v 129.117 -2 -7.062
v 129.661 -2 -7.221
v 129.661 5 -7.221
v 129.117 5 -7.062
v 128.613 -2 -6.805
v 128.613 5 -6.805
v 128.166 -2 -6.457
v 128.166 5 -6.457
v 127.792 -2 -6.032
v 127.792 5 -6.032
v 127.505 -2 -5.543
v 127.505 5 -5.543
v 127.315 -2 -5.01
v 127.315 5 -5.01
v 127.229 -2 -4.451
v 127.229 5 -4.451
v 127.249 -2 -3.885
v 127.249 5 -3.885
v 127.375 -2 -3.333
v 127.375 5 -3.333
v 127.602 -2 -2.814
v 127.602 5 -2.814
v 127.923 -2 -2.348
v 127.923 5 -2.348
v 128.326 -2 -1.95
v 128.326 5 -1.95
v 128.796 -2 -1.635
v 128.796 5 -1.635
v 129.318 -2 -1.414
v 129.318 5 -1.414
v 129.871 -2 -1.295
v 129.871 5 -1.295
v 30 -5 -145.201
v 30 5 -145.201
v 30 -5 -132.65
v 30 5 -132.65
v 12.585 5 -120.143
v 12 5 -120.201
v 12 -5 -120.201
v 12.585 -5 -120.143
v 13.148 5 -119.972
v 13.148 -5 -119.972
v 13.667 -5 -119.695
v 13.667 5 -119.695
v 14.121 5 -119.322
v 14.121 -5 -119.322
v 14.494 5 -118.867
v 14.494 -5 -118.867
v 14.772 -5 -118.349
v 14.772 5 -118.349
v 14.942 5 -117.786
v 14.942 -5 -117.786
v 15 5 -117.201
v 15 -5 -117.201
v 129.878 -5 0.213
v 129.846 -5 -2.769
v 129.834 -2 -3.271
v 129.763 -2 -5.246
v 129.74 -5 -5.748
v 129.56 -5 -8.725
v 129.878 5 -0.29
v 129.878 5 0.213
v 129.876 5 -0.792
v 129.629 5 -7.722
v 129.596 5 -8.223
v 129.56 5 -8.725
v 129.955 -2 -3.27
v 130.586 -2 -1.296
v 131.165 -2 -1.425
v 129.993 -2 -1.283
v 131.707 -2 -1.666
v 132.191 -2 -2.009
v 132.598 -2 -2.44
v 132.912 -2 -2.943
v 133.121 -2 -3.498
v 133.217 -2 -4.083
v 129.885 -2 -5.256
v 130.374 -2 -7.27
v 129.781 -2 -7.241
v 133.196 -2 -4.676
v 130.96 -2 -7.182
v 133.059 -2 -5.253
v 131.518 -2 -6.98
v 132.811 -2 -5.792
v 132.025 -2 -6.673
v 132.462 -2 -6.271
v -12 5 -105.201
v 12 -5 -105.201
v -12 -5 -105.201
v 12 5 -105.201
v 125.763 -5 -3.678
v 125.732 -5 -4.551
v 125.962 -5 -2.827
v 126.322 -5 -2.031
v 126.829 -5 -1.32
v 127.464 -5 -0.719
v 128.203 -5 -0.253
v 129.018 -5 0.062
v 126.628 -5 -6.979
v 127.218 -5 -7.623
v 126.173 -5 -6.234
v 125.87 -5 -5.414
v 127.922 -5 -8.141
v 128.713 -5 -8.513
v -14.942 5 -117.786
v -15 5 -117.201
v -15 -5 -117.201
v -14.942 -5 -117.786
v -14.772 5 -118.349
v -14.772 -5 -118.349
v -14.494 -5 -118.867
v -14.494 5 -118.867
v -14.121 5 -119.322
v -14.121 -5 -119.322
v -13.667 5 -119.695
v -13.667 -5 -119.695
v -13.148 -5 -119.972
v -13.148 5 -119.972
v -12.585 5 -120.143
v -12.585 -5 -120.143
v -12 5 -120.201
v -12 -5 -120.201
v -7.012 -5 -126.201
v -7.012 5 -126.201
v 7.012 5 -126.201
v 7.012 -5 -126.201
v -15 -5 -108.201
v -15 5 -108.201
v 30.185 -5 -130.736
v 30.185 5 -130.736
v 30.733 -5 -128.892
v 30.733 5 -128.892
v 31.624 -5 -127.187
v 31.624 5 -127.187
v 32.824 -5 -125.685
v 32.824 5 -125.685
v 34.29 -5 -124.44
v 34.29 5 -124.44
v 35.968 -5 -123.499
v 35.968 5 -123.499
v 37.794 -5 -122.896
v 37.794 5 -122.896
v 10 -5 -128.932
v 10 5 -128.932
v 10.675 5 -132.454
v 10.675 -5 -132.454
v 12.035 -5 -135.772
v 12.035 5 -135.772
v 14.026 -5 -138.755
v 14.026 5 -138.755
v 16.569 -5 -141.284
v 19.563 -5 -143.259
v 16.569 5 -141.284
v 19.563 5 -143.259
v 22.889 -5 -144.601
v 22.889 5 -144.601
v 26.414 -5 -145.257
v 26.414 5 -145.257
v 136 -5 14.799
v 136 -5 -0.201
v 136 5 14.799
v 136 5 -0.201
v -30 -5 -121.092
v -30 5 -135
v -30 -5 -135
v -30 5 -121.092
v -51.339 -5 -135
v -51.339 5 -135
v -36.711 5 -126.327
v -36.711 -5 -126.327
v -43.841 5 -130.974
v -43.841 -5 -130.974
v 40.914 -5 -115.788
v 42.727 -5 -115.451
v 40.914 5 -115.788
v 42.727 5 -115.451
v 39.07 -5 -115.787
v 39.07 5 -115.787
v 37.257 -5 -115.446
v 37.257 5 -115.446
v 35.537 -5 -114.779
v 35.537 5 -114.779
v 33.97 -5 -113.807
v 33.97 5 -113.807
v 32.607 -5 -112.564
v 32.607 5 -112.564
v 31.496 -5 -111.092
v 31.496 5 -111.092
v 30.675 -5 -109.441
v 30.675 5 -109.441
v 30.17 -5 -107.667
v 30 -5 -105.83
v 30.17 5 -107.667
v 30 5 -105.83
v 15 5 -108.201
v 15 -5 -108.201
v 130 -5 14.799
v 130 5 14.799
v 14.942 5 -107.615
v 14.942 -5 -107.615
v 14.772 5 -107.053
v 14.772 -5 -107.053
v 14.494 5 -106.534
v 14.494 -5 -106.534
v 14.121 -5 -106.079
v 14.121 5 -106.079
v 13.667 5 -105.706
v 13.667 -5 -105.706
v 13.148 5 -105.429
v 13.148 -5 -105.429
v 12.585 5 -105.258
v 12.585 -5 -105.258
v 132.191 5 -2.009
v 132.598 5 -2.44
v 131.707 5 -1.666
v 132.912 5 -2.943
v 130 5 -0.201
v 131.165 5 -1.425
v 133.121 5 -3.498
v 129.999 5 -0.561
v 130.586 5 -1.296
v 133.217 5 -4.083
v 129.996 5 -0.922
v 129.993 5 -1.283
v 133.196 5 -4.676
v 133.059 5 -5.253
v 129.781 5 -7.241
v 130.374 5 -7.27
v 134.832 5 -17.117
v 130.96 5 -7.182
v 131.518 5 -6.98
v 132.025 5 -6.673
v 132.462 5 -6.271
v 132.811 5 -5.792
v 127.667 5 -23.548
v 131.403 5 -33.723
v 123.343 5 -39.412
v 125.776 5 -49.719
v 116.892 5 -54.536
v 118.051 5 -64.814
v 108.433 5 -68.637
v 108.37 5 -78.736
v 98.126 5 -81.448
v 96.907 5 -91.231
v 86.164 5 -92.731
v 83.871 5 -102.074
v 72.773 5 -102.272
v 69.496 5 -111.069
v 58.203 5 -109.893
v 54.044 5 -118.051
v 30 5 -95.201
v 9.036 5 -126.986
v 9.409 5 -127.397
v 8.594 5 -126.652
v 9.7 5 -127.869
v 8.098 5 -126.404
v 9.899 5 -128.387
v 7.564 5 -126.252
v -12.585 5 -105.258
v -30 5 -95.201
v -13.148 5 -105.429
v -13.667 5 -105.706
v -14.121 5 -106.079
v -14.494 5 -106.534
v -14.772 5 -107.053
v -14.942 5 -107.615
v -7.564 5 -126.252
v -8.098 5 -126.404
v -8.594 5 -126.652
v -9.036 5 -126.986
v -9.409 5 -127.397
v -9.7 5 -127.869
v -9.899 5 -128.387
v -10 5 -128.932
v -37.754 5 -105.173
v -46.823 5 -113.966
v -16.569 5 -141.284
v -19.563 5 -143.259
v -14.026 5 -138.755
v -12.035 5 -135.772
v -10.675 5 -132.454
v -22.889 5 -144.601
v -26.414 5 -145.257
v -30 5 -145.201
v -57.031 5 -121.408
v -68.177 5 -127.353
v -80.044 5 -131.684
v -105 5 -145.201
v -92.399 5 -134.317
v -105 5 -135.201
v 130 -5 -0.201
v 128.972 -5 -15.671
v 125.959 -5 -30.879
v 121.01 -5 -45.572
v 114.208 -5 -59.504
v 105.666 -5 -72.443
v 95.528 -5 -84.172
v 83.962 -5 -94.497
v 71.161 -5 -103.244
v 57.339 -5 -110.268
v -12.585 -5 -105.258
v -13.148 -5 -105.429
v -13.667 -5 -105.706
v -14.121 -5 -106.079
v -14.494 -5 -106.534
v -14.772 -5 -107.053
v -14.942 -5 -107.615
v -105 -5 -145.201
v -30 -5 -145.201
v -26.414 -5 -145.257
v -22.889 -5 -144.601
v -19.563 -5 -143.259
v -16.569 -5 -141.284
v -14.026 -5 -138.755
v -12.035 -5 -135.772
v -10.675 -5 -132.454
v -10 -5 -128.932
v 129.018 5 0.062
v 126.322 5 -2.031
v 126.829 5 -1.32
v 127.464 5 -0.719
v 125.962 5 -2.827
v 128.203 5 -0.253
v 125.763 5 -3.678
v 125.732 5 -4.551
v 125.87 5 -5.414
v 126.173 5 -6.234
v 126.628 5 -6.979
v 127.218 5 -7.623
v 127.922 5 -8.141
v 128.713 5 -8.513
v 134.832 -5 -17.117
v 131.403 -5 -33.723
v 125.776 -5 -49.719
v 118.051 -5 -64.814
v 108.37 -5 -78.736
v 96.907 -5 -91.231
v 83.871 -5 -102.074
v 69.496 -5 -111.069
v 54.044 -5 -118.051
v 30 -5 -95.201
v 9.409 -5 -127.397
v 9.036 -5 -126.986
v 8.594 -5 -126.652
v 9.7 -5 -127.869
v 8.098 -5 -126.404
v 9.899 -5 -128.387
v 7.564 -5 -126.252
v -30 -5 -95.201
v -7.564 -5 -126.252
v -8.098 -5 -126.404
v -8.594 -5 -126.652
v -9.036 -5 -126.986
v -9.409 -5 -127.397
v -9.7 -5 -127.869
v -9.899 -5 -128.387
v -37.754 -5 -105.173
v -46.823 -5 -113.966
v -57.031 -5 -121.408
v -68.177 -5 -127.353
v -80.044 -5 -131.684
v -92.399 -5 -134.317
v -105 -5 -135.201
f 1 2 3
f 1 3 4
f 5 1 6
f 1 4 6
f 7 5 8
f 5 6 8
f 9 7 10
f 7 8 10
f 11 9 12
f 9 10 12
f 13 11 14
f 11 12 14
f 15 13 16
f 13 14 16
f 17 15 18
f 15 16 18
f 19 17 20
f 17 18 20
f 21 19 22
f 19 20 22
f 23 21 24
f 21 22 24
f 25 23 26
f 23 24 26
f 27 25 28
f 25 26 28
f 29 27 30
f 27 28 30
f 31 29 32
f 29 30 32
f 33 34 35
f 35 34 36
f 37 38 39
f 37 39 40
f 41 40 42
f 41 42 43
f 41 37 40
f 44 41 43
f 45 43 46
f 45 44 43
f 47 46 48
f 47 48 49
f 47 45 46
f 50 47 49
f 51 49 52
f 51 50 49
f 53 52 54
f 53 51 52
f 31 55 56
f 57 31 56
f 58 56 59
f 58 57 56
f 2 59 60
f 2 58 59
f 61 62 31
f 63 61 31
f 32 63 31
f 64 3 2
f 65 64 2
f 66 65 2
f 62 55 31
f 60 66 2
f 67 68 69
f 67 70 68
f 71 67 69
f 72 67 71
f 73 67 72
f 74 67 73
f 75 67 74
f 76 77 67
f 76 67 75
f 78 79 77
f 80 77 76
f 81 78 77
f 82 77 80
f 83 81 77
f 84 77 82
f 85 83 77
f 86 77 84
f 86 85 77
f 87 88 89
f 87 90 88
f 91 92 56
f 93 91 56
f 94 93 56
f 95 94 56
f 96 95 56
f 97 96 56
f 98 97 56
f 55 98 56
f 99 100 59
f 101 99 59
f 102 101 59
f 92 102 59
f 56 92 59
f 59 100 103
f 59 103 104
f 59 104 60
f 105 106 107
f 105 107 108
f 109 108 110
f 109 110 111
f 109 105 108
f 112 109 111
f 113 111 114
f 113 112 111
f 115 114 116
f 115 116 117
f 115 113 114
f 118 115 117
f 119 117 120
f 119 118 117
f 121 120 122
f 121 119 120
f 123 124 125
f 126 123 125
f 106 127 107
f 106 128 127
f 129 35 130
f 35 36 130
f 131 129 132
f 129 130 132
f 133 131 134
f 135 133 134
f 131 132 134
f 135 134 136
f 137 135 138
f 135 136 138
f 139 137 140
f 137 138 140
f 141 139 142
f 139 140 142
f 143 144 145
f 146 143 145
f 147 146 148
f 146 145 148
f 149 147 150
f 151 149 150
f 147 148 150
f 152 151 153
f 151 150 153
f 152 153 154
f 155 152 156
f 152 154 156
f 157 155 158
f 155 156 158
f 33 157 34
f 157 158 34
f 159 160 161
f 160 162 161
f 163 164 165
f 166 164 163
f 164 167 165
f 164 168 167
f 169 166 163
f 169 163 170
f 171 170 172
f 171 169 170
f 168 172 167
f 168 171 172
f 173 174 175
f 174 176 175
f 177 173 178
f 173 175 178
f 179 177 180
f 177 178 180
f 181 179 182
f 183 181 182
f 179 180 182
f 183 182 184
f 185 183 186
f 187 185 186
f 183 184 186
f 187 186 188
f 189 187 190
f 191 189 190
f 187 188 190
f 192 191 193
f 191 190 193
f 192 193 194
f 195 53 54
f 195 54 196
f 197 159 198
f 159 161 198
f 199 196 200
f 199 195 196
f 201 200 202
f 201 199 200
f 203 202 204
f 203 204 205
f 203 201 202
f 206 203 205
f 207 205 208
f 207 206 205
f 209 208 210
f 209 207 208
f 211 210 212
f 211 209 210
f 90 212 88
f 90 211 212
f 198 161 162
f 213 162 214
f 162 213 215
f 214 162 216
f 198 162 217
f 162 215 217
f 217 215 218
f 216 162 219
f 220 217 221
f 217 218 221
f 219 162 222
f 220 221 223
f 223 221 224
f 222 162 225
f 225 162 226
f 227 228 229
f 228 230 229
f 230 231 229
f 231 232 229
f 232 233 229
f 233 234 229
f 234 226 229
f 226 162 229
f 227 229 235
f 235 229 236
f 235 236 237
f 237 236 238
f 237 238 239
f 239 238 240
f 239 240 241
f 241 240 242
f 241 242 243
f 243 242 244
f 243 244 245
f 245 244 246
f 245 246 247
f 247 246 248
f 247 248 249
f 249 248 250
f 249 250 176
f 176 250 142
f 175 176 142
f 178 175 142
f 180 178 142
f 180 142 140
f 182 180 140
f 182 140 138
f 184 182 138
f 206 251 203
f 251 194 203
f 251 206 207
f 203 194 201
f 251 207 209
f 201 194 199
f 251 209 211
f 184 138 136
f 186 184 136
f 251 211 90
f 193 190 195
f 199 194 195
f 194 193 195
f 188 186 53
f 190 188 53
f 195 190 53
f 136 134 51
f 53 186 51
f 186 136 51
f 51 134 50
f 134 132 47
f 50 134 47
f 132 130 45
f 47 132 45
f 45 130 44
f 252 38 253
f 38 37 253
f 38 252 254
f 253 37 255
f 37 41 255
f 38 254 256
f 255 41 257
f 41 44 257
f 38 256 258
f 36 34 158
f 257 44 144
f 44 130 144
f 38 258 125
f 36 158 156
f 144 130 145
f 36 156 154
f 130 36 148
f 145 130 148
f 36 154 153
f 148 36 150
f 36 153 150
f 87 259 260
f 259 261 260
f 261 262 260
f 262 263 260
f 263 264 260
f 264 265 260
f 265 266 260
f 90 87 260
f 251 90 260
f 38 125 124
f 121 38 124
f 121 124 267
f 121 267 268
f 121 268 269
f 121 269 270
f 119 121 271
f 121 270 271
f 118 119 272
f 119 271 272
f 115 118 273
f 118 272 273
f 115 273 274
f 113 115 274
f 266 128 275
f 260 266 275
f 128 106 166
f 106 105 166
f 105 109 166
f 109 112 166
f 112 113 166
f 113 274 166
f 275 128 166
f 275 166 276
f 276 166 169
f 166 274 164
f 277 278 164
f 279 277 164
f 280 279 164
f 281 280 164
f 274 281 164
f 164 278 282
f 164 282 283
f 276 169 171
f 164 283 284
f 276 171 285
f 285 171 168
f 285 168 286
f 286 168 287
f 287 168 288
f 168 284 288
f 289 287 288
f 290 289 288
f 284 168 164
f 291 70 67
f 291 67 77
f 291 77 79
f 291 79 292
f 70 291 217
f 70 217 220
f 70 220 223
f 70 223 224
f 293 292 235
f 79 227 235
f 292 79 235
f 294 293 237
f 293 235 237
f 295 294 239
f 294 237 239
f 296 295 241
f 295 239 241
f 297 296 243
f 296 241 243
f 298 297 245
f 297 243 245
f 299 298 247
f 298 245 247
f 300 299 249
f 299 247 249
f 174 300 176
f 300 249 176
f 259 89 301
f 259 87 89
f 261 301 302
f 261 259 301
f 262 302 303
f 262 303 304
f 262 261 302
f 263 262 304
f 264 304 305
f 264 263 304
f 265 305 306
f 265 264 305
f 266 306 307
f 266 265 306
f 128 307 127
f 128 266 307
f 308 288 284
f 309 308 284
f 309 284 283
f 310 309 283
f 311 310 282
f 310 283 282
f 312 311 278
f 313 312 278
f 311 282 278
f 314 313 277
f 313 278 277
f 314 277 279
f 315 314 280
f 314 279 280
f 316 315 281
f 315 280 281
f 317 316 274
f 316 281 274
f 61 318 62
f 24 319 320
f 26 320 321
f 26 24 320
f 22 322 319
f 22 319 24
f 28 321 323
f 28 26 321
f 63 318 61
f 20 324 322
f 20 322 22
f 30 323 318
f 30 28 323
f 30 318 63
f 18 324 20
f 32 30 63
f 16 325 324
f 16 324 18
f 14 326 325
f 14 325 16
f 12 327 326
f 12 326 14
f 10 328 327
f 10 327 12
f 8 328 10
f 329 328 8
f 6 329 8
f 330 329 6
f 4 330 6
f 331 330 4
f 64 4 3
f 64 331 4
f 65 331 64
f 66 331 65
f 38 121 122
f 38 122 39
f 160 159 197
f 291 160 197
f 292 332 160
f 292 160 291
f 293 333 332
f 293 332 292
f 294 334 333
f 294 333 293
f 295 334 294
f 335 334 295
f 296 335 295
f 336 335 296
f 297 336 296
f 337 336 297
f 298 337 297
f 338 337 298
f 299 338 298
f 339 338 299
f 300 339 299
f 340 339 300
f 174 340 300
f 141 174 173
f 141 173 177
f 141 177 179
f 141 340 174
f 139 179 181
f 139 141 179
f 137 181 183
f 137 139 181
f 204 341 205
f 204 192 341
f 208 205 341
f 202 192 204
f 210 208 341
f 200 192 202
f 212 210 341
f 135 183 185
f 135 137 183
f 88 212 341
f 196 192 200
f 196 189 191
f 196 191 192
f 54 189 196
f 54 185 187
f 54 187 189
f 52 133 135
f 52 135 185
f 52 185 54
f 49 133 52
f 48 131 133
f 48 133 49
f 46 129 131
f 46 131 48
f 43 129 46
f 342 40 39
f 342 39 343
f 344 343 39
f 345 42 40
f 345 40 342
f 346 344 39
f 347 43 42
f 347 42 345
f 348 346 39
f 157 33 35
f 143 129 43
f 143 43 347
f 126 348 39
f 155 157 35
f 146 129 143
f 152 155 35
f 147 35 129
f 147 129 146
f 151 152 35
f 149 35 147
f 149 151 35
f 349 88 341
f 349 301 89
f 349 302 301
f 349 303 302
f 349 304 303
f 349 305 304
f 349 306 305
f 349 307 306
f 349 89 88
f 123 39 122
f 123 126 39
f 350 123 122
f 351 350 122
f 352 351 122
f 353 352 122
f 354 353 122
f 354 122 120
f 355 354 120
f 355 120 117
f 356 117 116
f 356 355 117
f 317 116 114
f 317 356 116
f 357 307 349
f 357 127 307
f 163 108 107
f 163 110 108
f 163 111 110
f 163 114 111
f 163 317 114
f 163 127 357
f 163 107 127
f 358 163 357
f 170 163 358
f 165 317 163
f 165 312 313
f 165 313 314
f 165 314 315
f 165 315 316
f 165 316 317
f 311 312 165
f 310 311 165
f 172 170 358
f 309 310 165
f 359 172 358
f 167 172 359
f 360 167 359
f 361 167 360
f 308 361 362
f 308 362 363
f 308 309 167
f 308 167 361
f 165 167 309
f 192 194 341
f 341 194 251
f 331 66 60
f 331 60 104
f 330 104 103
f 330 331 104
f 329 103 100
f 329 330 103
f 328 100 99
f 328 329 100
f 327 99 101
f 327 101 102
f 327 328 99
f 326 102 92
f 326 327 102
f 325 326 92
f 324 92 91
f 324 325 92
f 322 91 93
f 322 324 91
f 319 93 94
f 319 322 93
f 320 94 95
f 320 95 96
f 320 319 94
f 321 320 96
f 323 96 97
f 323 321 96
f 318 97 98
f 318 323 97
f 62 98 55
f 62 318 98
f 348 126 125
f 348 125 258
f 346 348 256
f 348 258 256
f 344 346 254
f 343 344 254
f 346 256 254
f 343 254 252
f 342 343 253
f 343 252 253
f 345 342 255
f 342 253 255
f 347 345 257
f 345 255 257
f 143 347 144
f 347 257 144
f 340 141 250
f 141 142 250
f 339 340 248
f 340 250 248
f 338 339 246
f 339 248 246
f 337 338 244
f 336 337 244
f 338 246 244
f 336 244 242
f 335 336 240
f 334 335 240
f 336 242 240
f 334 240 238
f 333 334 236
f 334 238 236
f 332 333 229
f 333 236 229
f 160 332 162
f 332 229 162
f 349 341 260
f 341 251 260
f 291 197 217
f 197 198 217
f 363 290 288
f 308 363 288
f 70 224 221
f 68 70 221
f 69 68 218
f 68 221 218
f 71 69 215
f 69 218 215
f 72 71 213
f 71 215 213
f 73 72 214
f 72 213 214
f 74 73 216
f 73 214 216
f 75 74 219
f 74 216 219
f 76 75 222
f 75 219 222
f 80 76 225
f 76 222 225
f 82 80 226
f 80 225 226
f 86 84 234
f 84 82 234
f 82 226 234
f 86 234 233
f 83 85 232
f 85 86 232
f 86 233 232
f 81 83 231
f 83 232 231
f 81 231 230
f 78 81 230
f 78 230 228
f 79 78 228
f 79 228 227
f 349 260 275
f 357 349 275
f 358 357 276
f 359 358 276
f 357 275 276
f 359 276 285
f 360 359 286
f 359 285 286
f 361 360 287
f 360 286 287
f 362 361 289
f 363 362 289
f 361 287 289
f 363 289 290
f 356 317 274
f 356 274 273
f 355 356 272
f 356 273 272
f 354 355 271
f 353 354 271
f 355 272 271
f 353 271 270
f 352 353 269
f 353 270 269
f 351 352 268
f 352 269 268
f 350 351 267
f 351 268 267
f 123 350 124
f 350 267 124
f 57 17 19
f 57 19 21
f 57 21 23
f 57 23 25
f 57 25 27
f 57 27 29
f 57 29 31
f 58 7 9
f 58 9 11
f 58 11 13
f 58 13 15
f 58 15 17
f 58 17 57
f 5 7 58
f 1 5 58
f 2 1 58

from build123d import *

# Parameters (mm, degrees)
BOSS_EXTRUDE1_DEPTH = 5
BOSS_EXTRUDE2_DEPTH = 10
SKETCH4_R           = 3
CUT_EXTRUDE2_DEPTH  = 7


with BuildPart() as part:
    # Sketch1 → Boss-Extrude1 (new, symmetric)
    with BuildSketch(Plane(origin=(0, 0, 0), x_dir=(1, 0, 0), z_dir=(0, 1, 0))):
        with BuildLine():
            Line((30, 145.200641517), (30, 132.64991519))
            ThreePointArc((30, 132.64991519), (32.187867656, 126.407272462), (37.794117647, 122.896244956))
            ThreePointArc((37.794117647, 122.896244956), (108.370209653, 78.735645376), (135.99984025, 0.200641517))
            Line((135.99984025, 0.200641517), (135.99984025, -14.799358483))
            Line((135.99984025, -14.799358483), (129.999832262, -14.799358483))
            Line((129.999832262, -14.799358483), (129.999832262, 0.200641517))
            ThreePointArc((129.999832262, 0.200641517), (105.666355059, 72.44272572), (42.727272727, 115.450966301))
            ThreePointArc((42.727272727, 115.450966301), (33.969773108, 113.807292795), (30, 105.830052443))
            Line((30, 105.830052443), (30, 95.200641517))
            Line((30, 95.200641517), (-30, 95.200641517))
            ThreePointArc((-30, 95.200641517), (-62.5, 124.575641517), (-105, 135.200641517))
            Line((-105, 135.200641517), (-105, 145.200641517))
            Line((-105, 145.200641517), (-30, 145.200641517))
            ThreePointArc((-30, 145.200641517), (-16.569205688, 141.284017765), (-10, 128.932025452))
            ThreePointArc((-10, 128.932025452), (-9.036173455, 126.986386767), (-7.012049965, 126.200641517))
            Line((-7.012049965, 126.200641517), (7.012049965, 126.200641517))
            ThreePointArc((7.012049965, 126.200641517), (9.036173455, 126.986386767), (10, 128.932025452))
            ThreePointArc((10, 128.932025452), (16.569205688, 141.284017765), (30, 145.200641517))
        make_face()
        with BuildLine():
            Line((-15, 108.200641517), (-15, 117.200641517))
            ThreePointArc((-15, 117.200641517), (-14.121320344, 119.321961861), (-12, 120.200641517))
            Line((-12, 120.200641517), (12, 120.200641517))
            ThreePointArc((12, 120.200641517), (14.121320344, 119.321961861), (15, 117.200641517))
            Line((15, 117.200641517), (15, 108.200641517))
            ThreePointArc((15, 108.200641517), (14.121320344, 106.079321174), (12, 105.200641517))
            Line((12, 105.200641517), (-12, 105.200641517))
            ThreePointArc((-12, 105.200641517), (-14.121320344, 106.079321174), (-15, 108.200641517))
        make_face(mode=Mode.SUBTRACT)
        with BuildLine():
            Line((-51.339377009, 135), (-30, 135))
            Line((-30, 135), (-30, 121.091673029))
            ThreePointArc((-30, 121.091673029), (-40.226437609, 128.725910975), (-51.339377009, 135))
        make_face(mode=Mode.SUBTRACT)
    extrude(amount=BOSS_EXTRUDE1_DEPTH, both=True)


with BuildPart() as body_2:
    # Sketch3 → Boss-Extrude2 (new body)
    with BuildSketch(Plane(origin=(0, 5, 0), x_dir=(1, 0, 0), z_dir=(0, 1, 0))):
        with BuildLine():
            ThreePointArc((129.560346247, 8.724689949), (125.726139097, 4.113923257), (129.878068317, -0.212946017))
            ThreePointArc((129.878068317, -0.212946017), (129.802498492, 4.258832867), (129.560346247, 8.724689949))
        make_face()
    extrude(amount=-BOSS_EXTRUDE2_DEPTH)


with BuildPart() as cut_extrude2_tool:
    # Sketch4 → Cut-Extrude2 (new body)
    with BuildSketch(Plane(origin=(0, 5, 0), x_dir=(1, 0, 0), z_dir=(0, 1, 0))):
        with Locations((130.223298428, 4.273791792)):
            Circle(SKETCH4_R)
    extrude(amount=-CUT_EXTRUDE2_DEPTH)


with BuildPart() as part_1:
    add(part.part)

    # Cut-Extrude2: cut by cut_extrude2_tool
    add(cut_extrude2_tool.part, mode=Mode.SUBTRACT)


with BuildPart() as body_2_1:
    add(body_2.part)

    # Cut-Extrude2: cut by cut_extrude2_tool
    add(cut_extrude2_tool.part, mode=Mode.SUBTRACT)


solid = Compound([part_1.part, body_2_1.part])
